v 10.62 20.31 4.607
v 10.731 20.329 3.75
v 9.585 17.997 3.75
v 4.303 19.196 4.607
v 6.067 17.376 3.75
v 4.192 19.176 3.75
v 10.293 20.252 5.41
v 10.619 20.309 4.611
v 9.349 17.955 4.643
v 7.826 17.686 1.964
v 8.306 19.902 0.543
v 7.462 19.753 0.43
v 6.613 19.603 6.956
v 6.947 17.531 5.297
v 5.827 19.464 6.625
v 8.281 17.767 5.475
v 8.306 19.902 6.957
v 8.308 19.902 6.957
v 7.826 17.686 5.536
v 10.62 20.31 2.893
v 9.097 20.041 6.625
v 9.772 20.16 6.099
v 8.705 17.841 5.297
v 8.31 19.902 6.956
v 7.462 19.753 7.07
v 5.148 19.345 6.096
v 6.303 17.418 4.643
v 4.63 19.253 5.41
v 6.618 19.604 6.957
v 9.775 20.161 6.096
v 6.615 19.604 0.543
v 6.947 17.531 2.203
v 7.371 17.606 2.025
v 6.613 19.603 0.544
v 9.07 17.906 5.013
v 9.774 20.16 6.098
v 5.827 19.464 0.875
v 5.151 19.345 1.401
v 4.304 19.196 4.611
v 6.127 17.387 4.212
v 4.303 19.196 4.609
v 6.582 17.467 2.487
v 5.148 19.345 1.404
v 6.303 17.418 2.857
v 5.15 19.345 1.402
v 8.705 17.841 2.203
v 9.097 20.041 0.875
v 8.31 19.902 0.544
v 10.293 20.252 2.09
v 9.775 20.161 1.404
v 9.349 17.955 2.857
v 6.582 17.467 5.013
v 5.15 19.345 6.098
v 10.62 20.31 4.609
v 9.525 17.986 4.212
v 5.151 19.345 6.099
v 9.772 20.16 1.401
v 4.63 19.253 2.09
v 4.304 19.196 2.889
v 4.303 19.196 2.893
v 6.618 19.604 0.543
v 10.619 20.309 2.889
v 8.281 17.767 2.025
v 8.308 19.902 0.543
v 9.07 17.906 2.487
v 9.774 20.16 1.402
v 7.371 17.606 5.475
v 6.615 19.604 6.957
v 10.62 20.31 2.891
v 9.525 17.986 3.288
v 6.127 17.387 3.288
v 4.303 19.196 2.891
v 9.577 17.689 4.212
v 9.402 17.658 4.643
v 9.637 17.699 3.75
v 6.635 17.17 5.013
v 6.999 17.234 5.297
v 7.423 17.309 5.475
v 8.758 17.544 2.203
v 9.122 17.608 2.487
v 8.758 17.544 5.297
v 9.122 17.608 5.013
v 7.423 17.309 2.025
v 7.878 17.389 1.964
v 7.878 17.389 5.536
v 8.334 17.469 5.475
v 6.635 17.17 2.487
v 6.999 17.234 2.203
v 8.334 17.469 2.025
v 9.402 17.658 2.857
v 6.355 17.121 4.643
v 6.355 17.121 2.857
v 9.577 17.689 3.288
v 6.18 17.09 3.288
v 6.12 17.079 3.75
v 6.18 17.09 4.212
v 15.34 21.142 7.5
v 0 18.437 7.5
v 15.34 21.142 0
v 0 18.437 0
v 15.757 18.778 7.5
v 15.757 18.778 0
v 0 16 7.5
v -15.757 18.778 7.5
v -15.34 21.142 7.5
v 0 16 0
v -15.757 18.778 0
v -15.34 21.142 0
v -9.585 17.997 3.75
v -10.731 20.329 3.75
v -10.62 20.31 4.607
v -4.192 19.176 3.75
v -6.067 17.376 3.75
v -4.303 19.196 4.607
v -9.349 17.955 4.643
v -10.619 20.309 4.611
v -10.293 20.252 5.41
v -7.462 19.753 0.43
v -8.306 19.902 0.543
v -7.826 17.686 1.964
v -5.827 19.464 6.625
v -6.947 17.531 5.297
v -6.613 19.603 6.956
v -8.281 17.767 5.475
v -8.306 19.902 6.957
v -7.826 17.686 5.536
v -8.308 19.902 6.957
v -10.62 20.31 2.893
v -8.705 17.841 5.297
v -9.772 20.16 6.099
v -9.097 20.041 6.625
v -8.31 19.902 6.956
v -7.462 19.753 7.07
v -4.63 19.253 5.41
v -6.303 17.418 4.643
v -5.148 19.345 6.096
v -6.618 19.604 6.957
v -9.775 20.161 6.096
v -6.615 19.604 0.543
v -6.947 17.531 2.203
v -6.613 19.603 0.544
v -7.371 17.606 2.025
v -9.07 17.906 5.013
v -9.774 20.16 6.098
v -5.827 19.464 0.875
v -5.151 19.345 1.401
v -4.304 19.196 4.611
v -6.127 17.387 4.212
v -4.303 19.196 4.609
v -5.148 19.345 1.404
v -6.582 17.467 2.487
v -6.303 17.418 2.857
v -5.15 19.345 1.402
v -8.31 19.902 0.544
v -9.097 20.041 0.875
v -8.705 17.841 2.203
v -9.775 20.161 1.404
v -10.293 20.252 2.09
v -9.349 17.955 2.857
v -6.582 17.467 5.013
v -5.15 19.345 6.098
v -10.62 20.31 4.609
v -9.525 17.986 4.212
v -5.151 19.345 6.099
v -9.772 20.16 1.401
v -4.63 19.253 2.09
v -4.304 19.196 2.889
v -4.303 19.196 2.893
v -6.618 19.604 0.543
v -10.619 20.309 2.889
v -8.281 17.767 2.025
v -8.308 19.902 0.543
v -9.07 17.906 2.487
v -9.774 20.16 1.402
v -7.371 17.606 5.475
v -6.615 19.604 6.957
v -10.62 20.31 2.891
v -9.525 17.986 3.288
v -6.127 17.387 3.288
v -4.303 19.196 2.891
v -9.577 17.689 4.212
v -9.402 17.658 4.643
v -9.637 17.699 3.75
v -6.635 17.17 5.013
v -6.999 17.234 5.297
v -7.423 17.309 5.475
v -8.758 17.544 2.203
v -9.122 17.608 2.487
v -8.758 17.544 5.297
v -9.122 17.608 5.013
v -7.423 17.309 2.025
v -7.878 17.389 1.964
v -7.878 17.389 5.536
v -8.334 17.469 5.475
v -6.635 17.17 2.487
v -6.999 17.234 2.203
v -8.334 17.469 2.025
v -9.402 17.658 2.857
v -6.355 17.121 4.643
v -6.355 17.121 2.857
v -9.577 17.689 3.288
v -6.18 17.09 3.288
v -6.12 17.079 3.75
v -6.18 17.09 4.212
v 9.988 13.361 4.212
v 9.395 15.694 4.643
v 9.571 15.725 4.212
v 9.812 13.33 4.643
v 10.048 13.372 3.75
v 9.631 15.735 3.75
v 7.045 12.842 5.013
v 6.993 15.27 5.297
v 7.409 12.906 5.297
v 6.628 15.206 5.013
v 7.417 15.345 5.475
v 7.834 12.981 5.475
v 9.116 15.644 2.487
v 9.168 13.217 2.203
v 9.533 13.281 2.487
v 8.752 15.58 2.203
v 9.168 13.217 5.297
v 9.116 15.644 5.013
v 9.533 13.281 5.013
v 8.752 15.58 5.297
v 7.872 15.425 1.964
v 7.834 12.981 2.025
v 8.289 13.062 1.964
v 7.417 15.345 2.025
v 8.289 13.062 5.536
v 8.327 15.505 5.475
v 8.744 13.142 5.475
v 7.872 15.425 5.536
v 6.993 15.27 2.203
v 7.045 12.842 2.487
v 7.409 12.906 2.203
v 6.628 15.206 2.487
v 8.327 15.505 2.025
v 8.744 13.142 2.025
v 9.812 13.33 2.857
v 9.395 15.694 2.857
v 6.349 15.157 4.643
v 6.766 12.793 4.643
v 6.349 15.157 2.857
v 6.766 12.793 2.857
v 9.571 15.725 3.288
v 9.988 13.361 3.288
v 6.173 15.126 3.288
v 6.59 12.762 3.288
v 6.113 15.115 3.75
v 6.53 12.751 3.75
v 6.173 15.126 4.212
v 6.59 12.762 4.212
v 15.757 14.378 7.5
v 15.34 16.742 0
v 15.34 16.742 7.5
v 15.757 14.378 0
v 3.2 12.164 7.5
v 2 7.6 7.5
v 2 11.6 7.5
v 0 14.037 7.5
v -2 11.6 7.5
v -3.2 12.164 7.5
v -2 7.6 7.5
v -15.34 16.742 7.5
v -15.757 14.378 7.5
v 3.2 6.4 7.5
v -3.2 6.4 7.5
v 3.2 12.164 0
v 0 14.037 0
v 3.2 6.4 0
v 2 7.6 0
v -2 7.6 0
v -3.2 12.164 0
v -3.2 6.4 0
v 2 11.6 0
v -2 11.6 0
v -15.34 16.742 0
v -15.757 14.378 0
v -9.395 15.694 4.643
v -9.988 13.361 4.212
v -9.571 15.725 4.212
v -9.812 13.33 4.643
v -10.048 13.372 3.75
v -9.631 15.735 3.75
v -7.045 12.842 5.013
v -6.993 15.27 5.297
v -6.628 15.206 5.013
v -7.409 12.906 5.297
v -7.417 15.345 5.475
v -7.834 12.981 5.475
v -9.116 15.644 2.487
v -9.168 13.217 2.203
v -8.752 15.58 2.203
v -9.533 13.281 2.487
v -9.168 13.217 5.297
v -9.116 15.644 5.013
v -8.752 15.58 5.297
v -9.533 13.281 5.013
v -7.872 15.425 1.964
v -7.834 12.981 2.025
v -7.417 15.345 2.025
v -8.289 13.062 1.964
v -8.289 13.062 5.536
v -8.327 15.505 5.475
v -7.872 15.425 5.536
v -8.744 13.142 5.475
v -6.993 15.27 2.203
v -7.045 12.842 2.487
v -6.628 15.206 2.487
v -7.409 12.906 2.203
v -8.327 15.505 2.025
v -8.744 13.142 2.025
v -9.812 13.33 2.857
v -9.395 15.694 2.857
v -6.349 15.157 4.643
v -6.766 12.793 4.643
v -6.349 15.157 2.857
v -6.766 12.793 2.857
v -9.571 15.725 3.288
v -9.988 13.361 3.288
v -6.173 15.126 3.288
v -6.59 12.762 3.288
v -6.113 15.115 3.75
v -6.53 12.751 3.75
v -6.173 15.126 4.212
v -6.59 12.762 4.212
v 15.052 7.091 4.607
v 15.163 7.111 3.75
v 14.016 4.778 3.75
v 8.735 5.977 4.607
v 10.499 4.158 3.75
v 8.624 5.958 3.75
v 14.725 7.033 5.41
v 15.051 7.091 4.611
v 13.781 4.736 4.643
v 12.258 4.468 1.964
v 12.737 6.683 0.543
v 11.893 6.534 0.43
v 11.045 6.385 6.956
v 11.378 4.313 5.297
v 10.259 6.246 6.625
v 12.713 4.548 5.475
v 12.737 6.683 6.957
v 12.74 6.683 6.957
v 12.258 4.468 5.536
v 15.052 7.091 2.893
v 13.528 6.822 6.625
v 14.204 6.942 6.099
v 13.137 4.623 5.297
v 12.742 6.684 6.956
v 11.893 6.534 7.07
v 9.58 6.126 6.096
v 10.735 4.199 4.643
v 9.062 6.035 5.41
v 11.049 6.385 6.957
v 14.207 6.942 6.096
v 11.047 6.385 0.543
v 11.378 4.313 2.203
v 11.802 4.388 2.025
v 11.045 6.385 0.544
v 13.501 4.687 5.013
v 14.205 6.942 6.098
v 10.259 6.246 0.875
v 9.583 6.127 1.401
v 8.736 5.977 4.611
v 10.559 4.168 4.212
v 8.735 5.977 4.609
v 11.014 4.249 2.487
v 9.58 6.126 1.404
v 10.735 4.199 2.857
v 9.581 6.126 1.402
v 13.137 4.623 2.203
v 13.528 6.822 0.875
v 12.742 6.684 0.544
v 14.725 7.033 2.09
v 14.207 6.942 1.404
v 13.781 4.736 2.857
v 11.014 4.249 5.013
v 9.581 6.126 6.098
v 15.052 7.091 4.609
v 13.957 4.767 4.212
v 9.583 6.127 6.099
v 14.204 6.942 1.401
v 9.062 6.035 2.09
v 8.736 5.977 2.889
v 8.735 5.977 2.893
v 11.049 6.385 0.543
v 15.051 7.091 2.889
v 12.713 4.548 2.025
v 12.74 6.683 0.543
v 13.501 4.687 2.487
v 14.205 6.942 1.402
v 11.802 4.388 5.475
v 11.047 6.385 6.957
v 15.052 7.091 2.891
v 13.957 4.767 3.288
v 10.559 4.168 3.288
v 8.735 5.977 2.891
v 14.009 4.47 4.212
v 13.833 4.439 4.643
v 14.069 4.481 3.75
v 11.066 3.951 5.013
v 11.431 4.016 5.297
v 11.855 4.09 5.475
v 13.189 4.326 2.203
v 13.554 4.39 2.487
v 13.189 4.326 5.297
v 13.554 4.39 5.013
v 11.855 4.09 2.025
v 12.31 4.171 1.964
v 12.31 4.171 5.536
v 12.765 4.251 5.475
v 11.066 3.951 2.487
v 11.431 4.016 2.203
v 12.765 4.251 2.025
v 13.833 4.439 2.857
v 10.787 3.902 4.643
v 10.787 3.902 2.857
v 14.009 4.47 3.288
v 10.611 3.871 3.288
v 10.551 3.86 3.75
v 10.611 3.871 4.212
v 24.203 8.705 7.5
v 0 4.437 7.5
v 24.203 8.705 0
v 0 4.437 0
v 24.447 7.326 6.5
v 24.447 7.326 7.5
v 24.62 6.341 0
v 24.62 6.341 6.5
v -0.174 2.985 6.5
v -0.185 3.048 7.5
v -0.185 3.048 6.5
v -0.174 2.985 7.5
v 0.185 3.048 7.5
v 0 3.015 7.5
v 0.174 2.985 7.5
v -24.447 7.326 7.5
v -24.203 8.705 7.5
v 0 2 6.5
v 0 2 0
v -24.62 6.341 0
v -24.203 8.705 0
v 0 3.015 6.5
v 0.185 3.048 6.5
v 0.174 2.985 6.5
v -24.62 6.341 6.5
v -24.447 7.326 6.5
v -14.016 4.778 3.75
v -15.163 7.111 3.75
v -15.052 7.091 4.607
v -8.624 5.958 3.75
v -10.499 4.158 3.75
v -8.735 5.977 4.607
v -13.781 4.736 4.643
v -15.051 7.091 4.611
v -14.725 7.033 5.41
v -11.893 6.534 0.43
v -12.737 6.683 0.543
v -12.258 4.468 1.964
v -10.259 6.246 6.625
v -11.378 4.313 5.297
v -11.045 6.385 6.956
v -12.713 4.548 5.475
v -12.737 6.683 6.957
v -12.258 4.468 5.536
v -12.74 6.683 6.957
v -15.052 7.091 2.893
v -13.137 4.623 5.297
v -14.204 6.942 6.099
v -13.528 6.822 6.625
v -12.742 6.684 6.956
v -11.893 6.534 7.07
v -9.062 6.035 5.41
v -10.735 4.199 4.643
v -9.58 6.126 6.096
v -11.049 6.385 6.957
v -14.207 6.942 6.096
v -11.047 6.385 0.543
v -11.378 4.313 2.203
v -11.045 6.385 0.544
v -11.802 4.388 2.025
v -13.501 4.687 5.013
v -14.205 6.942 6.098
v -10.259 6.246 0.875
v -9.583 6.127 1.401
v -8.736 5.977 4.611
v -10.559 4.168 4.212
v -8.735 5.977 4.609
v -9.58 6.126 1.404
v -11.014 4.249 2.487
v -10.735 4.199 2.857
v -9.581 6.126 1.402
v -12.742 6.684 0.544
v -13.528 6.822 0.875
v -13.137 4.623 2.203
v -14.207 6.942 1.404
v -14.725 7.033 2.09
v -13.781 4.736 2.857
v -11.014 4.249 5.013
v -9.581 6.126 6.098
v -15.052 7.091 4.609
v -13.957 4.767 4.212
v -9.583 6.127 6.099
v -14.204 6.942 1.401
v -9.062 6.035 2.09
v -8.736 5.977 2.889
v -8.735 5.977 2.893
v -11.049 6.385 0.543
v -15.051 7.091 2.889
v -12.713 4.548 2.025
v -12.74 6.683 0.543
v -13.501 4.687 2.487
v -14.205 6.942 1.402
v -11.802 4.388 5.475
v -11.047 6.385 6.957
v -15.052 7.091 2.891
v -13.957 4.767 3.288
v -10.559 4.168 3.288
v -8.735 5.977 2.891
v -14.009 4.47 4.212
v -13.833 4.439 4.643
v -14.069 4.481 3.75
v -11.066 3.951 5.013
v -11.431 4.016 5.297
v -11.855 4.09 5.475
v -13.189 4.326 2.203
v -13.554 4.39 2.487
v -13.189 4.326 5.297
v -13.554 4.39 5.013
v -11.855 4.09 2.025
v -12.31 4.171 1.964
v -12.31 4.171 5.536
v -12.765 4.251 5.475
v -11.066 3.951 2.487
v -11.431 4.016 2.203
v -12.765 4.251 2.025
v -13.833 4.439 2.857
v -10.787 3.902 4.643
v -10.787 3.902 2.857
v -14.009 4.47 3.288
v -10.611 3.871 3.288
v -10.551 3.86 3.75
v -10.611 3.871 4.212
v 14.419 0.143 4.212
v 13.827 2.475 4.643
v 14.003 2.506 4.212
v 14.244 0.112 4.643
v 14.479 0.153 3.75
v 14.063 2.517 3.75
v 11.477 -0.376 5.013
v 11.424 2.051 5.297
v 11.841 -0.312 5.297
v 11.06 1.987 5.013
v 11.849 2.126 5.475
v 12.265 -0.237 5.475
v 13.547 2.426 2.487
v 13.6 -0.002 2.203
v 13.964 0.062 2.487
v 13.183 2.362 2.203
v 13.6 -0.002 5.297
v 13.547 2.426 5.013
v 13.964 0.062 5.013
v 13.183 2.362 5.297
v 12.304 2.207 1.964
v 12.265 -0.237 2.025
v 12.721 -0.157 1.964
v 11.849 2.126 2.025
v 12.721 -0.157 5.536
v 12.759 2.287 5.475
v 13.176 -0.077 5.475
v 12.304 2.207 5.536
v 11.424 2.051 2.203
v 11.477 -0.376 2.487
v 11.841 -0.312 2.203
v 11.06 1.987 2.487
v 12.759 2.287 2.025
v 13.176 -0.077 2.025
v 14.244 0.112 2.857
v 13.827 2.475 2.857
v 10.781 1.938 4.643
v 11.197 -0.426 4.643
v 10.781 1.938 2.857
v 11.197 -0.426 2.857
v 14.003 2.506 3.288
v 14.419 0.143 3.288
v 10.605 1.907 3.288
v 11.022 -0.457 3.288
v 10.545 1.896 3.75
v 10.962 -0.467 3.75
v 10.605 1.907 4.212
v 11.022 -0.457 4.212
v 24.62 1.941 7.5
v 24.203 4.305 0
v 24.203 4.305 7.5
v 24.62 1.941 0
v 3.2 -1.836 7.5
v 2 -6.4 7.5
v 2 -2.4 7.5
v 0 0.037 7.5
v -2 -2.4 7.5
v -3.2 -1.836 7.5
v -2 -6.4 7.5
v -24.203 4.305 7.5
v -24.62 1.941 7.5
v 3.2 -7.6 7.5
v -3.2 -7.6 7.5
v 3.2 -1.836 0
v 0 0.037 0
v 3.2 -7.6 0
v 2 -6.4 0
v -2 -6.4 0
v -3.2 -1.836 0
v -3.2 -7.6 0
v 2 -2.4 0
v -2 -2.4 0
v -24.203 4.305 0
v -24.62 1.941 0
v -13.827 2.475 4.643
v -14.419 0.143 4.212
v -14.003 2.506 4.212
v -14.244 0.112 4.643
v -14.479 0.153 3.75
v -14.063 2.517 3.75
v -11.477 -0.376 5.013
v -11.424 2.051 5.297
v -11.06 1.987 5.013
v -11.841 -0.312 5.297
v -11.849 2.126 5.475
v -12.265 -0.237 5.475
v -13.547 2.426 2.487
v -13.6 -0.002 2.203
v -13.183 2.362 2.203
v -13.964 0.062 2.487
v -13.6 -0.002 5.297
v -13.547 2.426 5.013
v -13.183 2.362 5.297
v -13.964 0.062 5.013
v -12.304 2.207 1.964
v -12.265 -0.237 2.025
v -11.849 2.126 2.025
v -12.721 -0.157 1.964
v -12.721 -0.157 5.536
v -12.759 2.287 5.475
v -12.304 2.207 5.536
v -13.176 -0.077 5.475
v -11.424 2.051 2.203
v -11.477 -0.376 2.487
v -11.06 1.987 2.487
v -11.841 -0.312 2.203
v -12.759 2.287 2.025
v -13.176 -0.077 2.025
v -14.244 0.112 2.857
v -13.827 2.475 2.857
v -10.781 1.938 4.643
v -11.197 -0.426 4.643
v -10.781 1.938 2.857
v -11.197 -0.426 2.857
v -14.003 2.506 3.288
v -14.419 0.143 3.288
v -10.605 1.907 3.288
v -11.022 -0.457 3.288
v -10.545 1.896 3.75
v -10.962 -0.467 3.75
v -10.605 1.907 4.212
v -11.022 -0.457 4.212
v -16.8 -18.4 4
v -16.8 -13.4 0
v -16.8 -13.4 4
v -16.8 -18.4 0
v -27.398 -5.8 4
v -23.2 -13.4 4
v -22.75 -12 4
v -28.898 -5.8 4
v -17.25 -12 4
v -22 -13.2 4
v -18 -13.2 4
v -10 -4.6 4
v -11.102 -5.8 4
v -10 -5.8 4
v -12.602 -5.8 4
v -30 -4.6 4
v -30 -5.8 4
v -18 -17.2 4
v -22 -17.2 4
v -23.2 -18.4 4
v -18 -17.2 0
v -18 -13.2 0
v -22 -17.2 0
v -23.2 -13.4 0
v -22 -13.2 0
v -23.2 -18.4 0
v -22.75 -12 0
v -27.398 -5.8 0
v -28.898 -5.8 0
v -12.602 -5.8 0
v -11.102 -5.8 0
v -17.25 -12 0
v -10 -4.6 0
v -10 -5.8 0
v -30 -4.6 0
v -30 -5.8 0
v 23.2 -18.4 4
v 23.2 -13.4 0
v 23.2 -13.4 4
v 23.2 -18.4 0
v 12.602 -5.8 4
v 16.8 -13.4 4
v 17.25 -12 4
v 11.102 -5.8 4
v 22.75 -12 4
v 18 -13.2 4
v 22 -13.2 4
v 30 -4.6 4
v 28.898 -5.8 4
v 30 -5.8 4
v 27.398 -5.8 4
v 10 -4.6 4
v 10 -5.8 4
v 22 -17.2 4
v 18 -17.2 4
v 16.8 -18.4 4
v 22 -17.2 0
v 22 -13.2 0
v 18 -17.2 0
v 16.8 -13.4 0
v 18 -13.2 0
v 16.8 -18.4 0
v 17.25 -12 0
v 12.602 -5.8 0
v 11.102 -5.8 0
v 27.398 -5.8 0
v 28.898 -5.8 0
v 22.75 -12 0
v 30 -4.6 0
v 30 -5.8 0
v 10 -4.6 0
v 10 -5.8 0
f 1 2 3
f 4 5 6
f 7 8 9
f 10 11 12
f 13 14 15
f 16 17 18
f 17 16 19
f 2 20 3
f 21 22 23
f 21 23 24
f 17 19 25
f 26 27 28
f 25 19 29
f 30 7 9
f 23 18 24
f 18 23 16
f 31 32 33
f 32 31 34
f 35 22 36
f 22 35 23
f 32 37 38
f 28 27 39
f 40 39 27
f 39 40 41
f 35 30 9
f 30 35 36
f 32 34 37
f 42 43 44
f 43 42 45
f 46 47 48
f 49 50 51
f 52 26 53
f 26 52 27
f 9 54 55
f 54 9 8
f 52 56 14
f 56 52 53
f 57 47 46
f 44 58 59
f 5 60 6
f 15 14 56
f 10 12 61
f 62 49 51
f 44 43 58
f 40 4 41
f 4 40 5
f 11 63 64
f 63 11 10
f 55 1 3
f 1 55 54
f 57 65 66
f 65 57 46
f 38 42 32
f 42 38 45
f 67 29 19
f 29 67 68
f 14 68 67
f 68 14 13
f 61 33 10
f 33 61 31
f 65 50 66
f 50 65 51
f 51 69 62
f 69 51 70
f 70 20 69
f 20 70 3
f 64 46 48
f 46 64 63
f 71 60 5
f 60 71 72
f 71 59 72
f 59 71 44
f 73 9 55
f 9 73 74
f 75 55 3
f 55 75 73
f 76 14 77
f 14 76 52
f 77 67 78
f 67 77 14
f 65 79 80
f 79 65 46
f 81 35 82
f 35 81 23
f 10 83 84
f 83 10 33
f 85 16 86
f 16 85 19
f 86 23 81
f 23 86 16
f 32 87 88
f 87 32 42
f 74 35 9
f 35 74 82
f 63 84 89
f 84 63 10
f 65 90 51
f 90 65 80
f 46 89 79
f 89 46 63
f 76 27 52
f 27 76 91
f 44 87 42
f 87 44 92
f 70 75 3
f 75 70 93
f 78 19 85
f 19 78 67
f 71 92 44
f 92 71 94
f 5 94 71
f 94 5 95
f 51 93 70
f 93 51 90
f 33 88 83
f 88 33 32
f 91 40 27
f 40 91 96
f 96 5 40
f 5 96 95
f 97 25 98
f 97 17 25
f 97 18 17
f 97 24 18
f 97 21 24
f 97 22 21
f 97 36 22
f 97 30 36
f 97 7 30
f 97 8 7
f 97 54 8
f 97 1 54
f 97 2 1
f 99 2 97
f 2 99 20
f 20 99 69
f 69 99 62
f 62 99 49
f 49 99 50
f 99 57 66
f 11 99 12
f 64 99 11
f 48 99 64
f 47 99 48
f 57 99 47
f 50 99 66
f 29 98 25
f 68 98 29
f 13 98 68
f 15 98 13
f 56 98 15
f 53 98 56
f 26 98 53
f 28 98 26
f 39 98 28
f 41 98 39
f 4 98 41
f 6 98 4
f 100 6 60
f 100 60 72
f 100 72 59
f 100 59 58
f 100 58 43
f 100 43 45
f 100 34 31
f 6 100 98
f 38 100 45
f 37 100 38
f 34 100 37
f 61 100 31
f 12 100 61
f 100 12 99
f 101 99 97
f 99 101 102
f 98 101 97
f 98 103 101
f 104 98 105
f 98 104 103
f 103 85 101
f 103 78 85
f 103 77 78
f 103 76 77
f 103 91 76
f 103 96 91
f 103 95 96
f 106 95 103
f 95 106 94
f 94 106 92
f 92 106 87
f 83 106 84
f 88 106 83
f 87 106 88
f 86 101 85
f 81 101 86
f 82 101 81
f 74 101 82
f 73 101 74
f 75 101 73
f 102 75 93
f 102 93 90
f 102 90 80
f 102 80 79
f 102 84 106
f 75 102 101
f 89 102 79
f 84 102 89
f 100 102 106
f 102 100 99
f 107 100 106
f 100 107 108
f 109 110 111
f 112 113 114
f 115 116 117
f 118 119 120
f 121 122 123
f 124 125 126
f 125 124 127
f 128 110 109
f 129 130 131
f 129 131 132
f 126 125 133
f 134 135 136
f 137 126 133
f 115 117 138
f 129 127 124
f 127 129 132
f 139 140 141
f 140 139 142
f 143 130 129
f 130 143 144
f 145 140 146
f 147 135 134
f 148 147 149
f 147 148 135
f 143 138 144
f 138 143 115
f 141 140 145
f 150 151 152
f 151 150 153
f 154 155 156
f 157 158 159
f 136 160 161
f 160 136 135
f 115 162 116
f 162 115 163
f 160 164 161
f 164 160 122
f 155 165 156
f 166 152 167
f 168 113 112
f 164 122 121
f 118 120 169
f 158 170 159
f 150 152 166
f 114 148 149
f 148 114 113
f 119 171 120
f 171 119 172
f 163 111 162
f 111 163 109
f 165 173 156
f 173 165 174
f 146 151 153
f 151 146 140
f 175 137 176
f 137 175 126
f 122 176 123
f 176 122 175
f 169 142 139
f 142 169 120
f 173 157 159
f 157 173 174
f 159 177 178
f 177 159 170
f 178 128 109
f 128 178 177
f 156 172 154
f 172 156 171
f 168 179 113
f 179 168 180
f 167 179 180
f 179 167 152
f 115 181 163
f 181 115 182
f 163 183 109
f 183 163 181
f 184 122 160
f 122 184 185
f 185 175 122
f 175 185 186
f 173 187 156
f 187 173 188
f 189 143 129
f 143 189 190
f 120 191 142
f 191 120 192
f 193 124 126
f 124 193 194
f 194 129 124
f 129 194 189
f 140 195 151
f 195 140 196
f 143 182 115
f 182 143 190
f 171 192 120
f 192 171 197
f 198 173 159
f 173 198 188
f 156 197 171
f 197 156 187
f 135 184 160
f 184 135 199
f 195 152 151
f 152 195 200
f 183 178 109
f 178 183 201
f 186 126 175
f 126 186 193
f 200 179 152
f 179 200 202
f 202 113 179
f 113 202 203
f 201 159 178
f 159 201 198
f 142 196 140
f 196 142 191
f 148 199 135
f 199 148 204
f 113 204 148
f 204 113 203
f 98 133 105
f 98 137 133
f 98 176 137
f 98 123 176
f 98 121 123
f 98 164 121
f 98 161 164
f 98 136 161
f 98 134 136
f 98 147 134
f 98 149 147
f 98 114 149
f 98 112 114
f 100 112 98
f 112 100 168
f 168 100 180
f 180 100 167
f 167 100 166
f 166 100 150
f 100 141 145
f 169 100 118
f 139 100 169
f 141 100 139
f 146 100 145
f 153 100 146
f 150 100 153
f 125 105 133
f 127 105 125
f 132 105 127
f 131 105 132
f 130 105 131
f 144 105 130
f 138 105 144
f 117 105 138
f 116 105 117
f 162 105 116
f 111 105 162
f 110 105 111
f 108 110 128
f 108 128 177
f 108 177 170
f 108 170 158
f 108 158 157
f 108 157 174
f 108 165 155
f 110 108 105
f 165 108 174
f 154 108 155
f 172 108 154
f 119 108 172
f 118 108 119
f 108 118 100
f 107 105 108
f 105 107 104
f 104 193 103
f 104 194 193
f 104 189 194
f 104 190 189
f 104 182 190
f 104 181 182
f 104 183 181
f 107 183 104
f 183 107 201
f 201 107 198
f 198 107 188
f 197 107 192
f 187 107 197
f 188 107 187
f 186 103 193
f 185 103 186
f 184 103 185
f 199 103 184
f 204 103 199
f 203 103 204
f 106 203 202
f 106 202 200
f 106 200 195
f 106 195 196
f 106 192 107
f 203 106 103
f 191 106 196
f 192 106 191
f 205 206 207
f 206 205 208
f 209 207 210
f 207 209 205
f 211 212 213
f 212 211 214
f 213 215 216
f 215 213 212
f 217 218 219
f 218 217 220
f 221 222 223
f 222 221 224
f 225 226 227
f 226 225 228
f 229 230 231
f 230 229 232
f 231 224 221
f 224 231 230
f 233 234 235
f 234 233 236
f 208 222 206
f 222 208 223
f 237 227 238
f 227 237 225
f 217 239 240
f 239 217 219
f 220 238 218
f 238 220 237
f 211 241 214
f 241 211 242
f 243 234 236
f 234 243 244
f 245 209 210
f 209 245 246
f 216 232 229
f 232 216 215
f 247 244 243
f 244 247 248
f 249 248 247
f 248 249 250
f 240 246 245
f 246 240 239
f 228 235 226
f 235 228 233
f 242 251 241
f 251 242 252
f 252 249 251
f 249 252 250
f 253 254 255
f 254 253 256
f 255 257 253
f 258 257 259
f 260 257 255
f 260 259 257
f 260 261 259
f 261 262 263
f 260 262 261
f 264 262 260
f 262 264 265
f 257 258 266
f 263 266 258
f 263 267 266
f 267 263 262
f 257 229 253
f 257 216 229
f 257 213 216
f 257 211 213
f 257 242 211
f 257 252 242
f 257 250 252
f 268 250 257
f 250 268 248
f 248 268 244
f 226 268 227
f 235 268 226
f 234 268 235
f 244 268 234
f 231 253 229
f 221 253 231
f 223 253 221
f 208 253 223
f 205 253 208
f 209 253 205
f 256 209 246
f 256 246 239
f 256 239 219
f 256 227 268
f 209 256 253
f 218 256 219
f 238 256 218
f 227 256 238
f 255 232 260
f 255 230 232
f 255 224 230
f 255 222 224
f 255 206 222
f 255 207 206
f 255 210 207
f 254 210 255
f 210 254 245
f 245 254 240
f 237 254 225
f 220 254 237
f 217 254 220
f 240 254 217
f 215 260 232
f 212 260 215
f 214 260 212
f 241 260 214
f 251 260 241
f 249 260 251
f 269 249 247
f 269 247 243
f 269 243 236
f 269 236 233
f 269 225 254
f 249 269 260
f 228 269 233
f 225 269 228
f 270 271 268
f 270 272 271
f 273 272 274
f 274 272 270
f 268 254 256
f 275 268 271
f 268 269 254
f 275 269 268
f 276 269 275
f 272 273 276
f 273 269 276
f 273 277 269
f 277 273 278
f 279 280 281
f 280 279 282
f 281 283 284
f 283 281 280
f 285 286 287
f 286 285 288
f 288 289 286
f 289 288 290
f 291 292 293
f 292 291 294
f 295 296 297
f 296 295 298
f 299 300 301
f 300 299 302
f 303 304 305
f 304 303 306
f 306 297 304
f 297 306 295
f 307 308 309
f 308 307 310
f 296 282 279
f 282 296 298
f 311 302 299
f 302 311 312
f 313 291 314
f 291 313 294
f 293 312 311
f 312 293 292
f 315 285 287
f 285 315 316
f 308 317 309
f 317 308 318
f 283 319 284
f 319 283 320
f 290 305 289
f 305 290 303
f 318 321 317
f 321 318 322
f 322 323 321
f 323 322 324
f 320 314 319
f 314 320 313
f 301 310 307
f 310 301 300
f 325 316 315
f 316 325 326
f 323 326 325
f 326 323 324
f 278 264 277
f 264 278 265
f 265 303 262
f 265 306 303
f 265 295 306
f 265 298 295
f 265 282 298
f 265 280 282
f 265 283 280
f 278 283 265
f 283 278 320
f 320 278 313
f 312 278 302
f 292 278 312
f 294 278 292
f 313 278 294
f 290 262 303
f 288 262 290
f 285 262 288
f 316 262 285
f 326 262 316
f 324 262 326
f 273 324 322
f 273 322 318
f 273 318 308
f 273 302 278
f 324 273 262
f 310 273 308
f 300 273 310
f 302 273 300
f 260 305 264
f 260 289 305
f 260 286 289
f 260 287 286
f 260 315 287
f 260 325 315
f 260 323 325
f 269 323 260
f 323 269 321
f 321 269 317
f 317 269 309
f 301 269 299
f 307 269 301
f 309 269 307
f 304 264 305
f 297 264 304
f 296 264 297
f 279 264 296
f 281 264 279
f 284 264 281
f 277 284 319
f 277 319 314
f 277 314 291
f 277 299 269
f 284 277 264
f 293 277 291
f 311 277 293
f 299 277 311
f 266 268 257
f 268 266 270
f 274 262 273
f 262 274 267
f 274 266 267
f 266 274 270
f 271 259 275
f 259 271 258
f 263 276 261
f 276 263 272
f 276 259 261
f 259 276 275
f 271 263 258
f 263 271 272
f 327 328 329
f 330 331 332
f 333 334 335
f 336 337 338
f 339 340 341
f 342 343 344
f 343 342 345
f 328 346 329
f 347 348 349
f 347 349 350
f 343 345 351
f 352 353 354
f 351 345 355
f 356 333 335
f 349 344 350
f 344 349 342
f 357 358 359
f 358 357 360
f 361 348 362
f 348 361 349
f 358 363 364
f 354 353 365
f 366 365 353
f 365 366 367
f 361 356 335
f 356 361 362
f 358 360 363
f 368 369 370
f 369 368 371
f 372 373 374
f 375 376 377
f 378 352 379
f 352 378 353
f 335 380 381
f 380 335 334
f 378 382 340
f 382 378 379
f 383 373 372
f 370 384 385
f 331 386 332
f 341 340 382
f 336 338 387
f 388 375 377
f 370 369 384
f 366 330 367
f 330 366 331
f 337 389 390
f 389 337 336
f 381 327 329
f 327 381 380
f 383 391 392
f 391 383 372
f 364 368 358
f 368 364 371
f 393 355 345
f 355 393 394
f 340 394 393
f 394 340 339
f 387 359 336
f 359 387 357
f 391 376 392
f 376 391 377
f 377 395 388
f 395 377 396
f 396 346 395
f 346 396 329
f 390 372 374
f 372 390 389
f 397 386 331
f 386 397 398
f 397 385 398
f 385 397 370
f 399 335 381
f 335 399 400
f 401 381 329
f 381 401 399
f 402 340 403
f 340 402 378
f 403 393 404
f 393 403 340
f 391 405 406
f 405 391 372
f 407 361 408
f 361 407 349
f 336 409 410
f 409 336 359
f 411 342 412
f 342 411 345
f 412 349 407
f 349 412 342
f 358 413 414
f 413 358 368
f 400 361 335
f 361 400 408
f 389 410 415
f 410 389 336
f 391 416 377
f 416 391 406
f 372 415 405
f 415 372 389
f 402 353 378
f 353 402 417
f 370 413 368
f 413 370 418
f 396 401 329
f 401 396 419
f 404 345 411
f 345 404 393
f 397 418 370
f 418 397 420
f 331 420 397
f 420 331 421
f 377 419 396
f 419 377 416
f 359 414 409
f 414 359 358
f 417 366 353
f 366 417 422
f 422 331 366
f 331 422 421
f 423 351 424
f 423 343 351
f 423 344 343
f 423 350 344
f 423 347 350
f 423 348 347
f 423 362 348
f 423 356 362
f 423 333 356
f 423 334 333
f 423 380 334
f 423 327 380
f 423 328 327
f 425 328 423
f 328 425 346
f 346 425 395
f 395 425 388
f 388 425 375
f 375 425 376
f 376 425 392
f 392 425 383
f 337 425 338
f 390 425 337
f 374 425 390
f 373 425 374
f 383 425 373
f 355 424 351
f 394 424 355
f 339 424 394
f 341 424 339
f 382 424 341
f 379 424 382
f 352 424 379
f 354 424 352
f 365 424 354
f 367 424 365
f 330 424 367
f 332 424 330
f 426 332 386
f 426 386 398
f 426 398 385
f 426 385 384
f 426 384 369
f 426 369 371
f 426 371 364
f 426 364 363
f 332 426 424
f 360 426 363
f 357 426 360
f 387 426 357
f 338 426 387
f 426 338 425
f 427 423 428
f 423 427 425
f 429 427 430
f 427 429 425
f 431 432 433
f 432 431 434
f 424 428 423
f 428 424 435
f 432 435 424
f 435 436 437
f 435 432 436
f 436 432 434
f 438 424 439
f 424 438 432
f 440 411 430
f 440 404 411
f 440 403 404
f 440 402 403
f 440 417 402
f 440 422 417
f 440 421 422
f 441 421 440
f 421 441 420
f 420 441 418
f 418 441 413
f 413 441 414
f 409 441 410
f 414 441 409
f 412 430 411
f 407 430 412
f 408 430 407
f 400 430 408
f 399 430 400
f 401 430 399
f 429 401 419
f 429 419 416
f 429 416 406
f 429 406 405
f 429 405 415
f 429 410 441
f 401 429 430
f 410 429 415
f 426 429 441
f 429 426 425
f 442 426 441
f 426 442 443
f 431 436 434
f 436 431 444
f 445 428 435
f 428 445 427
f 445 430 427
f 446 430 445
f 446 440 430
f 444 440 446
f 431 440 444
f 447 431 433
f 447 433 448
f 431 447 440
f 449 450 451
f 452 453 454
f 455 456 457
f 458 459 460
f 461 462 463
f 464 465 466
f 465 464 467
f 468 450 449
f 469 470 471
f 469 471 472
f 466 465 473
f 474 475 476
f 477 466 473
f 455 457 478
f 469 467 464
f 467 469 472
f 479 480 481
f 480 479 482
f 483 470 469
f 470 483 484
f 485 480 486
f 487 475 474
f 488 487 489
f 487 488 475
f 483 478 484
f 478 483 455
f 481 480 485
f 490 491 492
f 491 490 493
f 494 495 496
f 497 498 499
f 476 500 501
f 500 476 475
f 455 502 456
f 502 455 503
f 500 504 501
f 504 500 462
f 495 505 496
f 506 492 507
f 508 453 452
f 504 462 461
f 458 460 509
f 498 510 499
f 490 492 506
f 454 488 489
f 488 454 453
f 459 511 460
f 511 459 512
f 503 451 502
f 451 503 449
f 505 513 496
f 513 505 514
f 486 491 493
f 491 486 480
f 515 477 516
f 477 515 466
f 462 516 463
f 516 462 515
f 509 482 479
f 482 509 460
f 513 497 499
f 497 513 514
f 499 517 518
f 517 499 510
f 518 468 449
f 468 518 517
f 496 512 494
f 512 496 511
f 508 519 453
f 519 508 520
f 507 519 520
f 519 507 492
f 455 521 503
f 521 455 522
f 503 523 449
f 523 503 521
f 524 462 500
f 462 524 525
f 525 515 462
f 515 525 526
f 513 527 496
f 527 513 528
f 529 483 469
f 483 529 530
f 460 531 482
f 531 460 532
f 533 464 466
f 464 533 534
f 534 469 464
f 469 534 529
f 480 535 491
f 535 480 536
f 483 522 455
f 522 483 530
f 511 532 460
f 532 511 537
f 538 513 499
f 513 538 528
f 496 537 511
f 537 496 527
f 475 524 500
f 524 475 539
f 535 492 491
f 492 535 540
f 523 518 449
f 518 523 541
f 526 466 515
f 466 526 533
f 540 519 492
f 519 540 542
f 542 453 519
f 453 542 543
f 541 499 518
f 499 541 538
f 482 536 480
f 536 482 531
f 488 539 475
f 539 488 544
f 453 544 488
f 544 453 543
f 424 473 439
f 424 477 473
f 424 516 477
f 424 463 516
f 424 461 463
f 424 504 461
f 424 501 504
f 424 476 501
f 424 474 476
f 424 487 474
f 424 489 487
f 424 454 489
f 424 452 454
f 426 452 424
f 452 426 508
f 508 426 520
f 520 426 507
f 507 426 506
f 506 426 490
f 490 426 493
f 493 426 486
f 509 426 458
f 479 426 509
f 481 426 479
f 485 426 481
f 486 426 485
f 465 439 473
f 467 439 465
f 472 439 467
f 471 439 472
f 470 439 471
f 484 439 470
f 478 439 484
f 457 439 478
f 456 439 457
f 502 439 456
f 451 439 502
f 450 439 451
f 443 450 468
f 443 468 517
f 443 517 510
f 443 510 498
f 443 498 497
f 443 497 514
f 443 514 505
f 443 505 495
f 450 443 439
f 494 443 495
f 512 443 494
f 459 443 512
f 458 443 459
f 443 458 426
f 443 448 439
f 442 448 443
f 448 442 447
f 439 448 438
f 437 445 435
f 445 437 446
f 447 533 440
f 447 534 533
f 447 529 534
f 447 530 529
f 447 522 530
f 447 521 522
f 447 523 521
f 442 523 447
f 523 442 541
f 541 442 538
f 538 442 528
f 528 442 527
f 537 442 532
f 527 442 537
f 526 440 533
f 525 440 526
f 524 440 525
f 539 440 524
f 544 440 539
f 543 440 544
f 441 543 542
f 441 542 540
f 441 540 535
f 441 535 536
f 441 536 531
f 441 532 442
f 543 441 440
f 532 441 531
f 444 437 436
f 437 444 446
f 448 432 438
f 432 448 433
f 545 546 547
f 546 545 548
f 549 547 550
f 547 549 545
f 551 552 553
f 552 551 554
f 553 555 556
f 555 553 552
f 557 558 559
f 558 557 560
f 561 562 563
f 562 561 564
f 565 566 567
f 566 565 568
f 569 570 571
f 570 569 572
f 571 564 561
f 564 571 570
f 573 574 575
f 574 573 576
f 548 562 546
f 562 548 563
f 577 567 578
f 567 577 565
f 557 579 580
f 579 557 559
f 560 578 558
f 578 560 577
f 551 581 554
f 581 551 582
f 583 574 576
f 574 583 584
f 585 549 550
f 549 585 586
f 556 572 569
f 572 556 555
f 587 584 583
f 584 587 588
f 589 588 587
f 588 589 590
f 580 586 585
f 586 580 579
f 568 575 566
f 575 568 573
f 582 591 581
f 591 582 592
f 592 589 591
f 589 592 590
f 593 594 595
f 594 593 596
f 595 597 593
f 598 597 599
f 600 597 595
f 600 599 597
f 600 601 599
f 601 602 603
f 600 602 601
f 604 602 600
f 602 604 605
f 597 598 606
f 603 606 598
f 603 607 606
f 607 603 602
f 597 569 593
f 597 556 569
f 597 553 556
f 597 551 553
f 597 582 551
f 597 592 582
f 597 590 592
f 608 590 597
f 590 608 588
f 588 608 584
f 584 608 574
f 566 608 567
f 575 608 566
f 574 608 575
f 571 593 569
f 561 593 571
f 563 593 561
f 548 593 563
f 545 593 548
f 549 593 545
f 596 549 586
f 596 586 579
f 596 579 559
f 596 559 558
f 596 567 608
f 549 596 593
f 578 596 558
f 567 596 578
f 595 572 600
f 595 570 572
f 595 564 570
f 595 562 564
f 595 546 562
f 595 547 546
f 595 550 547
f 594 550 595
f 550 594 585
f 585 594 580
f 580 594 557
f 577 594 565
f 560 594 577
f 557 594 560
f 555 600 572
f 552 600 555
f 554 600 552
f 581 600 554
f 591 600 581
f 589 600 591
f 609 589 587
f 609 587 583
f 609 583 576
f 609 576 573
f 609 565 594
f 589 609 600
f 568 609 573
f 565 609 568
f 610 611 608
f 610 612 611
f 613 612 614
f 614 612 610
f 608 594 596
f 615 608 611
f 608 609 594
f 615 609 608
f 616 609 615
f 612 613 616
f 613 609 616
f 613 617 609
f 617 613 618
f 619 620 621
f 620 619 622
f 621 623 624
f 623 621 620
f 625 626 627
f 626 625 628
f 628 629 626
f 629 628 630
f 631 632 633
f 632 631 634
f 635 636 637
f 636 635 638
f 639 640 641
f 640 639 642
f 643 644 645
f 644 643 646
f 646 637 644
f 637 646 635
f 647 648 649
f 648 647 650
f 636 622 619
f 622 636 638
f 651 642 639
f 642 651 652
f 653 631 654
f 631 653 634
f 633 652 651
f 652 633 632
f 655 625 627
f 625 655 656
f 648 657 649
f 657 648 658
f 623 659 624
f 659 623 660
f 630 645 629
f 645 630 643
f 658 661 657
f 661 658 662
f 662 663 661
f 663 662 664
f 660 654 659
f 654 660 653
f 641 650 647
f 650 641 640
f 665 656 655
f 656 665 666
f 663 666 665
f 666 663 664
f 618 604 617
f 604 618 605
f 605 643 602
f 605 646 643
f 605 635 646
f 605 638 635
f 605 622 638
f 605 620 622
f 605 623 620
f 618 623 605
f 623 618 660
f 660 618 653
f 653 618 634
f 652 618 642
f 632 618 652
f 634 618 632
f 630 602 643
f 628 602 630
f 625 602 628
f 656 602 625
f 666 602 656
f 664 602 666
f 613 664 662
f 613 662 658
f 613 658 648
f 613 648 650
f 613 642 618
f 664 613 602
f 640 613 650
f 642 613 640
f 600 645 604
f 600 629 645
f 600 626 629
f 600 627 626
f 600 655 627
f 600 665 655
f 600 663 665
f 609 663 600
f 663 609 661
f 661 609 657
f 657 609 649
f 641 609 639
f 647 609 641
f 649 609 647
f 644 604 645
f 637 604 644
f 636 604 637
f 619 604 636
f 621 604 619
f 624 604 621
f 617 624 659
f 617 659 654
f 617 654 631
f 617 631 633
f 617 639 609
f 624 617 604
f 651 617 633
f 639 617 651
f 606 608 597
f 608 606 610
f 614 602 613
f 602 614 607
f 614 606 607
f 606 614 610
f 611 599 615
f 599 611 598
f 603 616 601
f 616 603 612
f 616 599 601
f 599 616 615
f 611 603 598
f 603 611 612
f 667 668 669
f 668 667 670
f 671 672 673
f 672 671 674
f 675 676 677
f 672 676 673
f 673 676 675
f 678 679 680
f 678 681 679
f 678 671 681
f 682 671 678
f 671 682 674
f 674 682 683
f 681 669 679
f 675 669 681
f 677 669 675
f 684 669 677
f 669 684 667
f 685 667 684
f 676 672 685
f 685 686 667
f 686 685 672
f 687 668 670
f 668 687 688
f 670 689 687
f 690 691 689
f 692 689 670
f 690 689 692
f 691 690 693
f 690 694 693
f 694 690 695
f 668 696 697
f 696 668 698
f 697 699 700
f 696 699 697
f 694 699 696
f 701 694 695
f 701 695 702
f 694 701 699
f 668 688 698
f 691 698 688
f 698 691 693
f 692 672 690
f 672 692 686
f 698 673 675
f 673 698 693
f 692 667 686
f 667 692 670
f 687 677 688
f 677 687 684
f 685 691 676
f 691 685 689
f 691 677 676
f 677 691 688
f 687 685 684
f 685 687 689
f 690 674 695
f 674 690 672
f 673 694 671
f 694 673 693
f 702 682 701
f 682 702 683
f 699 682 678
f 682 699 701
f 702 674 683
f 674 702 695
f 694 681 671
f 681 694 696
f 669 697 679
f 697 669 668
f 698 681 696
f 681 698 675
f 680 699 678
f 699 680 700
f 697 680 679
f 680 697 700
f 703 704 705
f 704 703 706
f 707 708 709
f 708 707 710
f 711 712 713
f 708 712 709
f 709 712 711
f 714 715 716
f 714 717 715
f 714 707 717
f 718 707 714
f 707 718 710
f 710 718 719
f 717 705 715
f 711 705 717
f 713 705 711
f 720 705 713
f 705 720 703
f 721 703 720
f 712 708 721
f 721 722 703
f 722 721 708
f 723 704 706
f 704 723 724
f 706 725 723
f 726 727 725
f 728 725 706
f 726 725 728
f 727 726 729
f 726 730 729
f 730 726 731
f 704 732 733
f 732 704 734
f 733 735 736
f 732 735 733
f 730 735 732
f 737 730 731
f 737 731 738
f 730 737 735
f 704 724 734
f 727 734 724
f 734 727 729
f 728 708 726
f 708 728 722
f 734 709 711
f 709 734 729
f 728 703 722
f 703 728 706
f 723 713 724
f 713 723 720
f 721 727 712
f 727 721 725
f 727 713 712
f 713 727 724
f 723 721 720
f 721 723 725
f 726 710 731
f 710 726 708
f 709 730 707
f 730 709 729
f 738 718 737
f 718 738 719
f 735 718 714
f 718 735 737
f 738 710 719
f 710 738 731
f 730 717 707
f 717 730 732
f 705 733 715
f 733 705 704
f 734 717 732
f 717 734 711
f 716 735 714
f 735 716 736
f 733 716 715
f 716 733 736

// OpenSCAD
// file: No6_Hardware.scad
// A small module defining some #6 hardware shapes
// Use solid=true to get the ouerall size of a cutout
// Use tol = .1 (or similar) to allow for printer inaccuracy
// 
IN_TO_MM = 25.4;

screw_and_nut(3/4 * IN_TO_MM, tol=0.0);
//hex_nut6_slot(10);

diameter6      = IN_TO_MM * 9 / 64;
nut6_outer_dia = IN_TO_MM * 23 / 64;
nut6_thickness = IN_TO_MM * 7 / 64;
head_height6 = IN_TO_MM * 0.083;
head_dia6    = IN_TO_MM * 0.262;


module screw_and_nut(length, tol=0.0) {
    translate ([0, 0, length-(nut6_thickness+tol)]) 
        hex_nut6(tol=tol, solid=false);
    machine_screw6(length, tol=tol);
}

    
module hex_nut6(tol = 0, solid = false) {
    linear_extrude (nut6_thickness+tol) {
        difference () {
            circle(tol + nut6_outer_dia/2, $fn = 6);
            if (!solid)
                circle(diameter6/2, $fn = 24);
        }

    }
}


module machine_screw6(length, tol=0)
{
    union() {
        translate([0, 0, tol]) {
            cylinder(head_height6, tol+head_dia6/2, tol+diameter6/2, $fn=24);
            cylinder(length-tol, tol+diameter6/2, tol+diameter6/2, $fn=24);
        }
        cylinder(tol+.01, tol+head_dia6/2, tol+head_dia6/2, $fn=24);
    }
}


module hex_nut6_slot(length, tol = 0) {
    linear_extrude (nut6_thickness+tol) {
        circle(tol + nut6_outer_dia/2, $fn = 6);
        translate([-(tol + nut6_outer_dia/2), 0, 0])
            square([tol + nut6_outer_dia, length]);
    }
}
// main file
use <No6_Hardware.scad>

mm = 25.4;

fwd_incidence = 1;
z_thickness = 7.5;
y_thickness = 2.4;
tail_boom = 4;
wall = 2.4;

translate([0, 16, 0]) aft_diheadral_brace();
translate([0, 14, 0]) aft_wing_joiner();
translate([0, 2, 0]) fwd_diheadral_brace();
translate([0, 0, 0]) fwd_wing_joiner();
translate([-20, -12, 0]) stab_joiner();
translate([20, -12, 0]) stab_joiner();

module stab_joiner() {
    connecting_ring(4);
    stab_platform();
    mirror([1,0,0]) stab_platform();
}

module stab_platform() {
    sc = 2;
    w = 1.2;

    translate([-tail_boom/2, 0, 0]) {
        rotate([0, 0, 36.86]) 
            translate([-wall/2, (5*sc)/2-w/2, 4/2]) 
                cube([w, (5*sc), 4], center=true);
        translate([-3, (4*sc)-wall/2, 4/2]) 
                cube([6+tail_boom, w, 4], center=true);
    }
}

module connecting_ring(z_length=z_thickness) {

   translate([0,-(tail_boom+wall)/2,(z_length)/2]) 
        difference() {
            cube([(tail_boom+wall), (tail_boom+wall), z_length], center=true);
            cube([tail_boom, tail_boom, z_length], center=true);
        }
}

module arm(length, angle, offset=0, spar_notch=false)
{
    difference () {
        translate([0,offset,0])
            linear_extrude(height=z_thickness)
                rotate([0,0,angle])
                    square([length,y_thickness]);

        #screw_holes(length/2, angle);
        if (spar_notch) {
            #translate([0, offset, z_thickness-1]) 
                rotate([0,0,10]) 
                    cube([length, 1, 1]);

        }
    }
}

module screw_holes(length=12, angle=10) {
rotate([0,0,angle]) 
    translate([length,y_thickness+.01,z_thickness/2]) 
        rotate([90,0,0]) 
            machine_screw6(1/4*mm);
}

module aft_wing_joiner() {
    arm(16, 10, -y_thickness);
    mirror([1,0,0]) arm(16, 10, -y_thickness);
    translate([0, 1.2-y_thickness, 0]) connecting_ring();
}

module aft_diheadral_brace() {
    arm(16, 10, 0);
    mirror([1,0,0]) arm(16, 10, 0);
}

module fwd_wing_joiner() {
    arm(25, 10, -y_thickness);
    mirror([1,0,0]) arm(25, 10, -y_thickness);
    translate([0, 0, 0]) { // [0,-1,0] for 1 mm fwd incidence?
        translate([0, -y_thickness/2, 0]) connecting_ring();
        translate([0,-1.2, z_thickness/2])
            cube([tail_boom+wall, 2.4, z_thickness], center=true);
    }
}

module fwd_diheadral_brace() {
    arm(25, 10, 0, true);
    mirror([1,0,0]) arm(25, 10, 0, true);
}

module diheadral_brace() {
    difference() {
    translate([0,0,0]) linear_extrude(height=7.2)  {
        rotate([0,0,10]) square([24,2.4]);
        rotate([0,0,-10]) translate([-24,0,0]) square([24,2.4]);
    }
    screw_holes();
    }
}
